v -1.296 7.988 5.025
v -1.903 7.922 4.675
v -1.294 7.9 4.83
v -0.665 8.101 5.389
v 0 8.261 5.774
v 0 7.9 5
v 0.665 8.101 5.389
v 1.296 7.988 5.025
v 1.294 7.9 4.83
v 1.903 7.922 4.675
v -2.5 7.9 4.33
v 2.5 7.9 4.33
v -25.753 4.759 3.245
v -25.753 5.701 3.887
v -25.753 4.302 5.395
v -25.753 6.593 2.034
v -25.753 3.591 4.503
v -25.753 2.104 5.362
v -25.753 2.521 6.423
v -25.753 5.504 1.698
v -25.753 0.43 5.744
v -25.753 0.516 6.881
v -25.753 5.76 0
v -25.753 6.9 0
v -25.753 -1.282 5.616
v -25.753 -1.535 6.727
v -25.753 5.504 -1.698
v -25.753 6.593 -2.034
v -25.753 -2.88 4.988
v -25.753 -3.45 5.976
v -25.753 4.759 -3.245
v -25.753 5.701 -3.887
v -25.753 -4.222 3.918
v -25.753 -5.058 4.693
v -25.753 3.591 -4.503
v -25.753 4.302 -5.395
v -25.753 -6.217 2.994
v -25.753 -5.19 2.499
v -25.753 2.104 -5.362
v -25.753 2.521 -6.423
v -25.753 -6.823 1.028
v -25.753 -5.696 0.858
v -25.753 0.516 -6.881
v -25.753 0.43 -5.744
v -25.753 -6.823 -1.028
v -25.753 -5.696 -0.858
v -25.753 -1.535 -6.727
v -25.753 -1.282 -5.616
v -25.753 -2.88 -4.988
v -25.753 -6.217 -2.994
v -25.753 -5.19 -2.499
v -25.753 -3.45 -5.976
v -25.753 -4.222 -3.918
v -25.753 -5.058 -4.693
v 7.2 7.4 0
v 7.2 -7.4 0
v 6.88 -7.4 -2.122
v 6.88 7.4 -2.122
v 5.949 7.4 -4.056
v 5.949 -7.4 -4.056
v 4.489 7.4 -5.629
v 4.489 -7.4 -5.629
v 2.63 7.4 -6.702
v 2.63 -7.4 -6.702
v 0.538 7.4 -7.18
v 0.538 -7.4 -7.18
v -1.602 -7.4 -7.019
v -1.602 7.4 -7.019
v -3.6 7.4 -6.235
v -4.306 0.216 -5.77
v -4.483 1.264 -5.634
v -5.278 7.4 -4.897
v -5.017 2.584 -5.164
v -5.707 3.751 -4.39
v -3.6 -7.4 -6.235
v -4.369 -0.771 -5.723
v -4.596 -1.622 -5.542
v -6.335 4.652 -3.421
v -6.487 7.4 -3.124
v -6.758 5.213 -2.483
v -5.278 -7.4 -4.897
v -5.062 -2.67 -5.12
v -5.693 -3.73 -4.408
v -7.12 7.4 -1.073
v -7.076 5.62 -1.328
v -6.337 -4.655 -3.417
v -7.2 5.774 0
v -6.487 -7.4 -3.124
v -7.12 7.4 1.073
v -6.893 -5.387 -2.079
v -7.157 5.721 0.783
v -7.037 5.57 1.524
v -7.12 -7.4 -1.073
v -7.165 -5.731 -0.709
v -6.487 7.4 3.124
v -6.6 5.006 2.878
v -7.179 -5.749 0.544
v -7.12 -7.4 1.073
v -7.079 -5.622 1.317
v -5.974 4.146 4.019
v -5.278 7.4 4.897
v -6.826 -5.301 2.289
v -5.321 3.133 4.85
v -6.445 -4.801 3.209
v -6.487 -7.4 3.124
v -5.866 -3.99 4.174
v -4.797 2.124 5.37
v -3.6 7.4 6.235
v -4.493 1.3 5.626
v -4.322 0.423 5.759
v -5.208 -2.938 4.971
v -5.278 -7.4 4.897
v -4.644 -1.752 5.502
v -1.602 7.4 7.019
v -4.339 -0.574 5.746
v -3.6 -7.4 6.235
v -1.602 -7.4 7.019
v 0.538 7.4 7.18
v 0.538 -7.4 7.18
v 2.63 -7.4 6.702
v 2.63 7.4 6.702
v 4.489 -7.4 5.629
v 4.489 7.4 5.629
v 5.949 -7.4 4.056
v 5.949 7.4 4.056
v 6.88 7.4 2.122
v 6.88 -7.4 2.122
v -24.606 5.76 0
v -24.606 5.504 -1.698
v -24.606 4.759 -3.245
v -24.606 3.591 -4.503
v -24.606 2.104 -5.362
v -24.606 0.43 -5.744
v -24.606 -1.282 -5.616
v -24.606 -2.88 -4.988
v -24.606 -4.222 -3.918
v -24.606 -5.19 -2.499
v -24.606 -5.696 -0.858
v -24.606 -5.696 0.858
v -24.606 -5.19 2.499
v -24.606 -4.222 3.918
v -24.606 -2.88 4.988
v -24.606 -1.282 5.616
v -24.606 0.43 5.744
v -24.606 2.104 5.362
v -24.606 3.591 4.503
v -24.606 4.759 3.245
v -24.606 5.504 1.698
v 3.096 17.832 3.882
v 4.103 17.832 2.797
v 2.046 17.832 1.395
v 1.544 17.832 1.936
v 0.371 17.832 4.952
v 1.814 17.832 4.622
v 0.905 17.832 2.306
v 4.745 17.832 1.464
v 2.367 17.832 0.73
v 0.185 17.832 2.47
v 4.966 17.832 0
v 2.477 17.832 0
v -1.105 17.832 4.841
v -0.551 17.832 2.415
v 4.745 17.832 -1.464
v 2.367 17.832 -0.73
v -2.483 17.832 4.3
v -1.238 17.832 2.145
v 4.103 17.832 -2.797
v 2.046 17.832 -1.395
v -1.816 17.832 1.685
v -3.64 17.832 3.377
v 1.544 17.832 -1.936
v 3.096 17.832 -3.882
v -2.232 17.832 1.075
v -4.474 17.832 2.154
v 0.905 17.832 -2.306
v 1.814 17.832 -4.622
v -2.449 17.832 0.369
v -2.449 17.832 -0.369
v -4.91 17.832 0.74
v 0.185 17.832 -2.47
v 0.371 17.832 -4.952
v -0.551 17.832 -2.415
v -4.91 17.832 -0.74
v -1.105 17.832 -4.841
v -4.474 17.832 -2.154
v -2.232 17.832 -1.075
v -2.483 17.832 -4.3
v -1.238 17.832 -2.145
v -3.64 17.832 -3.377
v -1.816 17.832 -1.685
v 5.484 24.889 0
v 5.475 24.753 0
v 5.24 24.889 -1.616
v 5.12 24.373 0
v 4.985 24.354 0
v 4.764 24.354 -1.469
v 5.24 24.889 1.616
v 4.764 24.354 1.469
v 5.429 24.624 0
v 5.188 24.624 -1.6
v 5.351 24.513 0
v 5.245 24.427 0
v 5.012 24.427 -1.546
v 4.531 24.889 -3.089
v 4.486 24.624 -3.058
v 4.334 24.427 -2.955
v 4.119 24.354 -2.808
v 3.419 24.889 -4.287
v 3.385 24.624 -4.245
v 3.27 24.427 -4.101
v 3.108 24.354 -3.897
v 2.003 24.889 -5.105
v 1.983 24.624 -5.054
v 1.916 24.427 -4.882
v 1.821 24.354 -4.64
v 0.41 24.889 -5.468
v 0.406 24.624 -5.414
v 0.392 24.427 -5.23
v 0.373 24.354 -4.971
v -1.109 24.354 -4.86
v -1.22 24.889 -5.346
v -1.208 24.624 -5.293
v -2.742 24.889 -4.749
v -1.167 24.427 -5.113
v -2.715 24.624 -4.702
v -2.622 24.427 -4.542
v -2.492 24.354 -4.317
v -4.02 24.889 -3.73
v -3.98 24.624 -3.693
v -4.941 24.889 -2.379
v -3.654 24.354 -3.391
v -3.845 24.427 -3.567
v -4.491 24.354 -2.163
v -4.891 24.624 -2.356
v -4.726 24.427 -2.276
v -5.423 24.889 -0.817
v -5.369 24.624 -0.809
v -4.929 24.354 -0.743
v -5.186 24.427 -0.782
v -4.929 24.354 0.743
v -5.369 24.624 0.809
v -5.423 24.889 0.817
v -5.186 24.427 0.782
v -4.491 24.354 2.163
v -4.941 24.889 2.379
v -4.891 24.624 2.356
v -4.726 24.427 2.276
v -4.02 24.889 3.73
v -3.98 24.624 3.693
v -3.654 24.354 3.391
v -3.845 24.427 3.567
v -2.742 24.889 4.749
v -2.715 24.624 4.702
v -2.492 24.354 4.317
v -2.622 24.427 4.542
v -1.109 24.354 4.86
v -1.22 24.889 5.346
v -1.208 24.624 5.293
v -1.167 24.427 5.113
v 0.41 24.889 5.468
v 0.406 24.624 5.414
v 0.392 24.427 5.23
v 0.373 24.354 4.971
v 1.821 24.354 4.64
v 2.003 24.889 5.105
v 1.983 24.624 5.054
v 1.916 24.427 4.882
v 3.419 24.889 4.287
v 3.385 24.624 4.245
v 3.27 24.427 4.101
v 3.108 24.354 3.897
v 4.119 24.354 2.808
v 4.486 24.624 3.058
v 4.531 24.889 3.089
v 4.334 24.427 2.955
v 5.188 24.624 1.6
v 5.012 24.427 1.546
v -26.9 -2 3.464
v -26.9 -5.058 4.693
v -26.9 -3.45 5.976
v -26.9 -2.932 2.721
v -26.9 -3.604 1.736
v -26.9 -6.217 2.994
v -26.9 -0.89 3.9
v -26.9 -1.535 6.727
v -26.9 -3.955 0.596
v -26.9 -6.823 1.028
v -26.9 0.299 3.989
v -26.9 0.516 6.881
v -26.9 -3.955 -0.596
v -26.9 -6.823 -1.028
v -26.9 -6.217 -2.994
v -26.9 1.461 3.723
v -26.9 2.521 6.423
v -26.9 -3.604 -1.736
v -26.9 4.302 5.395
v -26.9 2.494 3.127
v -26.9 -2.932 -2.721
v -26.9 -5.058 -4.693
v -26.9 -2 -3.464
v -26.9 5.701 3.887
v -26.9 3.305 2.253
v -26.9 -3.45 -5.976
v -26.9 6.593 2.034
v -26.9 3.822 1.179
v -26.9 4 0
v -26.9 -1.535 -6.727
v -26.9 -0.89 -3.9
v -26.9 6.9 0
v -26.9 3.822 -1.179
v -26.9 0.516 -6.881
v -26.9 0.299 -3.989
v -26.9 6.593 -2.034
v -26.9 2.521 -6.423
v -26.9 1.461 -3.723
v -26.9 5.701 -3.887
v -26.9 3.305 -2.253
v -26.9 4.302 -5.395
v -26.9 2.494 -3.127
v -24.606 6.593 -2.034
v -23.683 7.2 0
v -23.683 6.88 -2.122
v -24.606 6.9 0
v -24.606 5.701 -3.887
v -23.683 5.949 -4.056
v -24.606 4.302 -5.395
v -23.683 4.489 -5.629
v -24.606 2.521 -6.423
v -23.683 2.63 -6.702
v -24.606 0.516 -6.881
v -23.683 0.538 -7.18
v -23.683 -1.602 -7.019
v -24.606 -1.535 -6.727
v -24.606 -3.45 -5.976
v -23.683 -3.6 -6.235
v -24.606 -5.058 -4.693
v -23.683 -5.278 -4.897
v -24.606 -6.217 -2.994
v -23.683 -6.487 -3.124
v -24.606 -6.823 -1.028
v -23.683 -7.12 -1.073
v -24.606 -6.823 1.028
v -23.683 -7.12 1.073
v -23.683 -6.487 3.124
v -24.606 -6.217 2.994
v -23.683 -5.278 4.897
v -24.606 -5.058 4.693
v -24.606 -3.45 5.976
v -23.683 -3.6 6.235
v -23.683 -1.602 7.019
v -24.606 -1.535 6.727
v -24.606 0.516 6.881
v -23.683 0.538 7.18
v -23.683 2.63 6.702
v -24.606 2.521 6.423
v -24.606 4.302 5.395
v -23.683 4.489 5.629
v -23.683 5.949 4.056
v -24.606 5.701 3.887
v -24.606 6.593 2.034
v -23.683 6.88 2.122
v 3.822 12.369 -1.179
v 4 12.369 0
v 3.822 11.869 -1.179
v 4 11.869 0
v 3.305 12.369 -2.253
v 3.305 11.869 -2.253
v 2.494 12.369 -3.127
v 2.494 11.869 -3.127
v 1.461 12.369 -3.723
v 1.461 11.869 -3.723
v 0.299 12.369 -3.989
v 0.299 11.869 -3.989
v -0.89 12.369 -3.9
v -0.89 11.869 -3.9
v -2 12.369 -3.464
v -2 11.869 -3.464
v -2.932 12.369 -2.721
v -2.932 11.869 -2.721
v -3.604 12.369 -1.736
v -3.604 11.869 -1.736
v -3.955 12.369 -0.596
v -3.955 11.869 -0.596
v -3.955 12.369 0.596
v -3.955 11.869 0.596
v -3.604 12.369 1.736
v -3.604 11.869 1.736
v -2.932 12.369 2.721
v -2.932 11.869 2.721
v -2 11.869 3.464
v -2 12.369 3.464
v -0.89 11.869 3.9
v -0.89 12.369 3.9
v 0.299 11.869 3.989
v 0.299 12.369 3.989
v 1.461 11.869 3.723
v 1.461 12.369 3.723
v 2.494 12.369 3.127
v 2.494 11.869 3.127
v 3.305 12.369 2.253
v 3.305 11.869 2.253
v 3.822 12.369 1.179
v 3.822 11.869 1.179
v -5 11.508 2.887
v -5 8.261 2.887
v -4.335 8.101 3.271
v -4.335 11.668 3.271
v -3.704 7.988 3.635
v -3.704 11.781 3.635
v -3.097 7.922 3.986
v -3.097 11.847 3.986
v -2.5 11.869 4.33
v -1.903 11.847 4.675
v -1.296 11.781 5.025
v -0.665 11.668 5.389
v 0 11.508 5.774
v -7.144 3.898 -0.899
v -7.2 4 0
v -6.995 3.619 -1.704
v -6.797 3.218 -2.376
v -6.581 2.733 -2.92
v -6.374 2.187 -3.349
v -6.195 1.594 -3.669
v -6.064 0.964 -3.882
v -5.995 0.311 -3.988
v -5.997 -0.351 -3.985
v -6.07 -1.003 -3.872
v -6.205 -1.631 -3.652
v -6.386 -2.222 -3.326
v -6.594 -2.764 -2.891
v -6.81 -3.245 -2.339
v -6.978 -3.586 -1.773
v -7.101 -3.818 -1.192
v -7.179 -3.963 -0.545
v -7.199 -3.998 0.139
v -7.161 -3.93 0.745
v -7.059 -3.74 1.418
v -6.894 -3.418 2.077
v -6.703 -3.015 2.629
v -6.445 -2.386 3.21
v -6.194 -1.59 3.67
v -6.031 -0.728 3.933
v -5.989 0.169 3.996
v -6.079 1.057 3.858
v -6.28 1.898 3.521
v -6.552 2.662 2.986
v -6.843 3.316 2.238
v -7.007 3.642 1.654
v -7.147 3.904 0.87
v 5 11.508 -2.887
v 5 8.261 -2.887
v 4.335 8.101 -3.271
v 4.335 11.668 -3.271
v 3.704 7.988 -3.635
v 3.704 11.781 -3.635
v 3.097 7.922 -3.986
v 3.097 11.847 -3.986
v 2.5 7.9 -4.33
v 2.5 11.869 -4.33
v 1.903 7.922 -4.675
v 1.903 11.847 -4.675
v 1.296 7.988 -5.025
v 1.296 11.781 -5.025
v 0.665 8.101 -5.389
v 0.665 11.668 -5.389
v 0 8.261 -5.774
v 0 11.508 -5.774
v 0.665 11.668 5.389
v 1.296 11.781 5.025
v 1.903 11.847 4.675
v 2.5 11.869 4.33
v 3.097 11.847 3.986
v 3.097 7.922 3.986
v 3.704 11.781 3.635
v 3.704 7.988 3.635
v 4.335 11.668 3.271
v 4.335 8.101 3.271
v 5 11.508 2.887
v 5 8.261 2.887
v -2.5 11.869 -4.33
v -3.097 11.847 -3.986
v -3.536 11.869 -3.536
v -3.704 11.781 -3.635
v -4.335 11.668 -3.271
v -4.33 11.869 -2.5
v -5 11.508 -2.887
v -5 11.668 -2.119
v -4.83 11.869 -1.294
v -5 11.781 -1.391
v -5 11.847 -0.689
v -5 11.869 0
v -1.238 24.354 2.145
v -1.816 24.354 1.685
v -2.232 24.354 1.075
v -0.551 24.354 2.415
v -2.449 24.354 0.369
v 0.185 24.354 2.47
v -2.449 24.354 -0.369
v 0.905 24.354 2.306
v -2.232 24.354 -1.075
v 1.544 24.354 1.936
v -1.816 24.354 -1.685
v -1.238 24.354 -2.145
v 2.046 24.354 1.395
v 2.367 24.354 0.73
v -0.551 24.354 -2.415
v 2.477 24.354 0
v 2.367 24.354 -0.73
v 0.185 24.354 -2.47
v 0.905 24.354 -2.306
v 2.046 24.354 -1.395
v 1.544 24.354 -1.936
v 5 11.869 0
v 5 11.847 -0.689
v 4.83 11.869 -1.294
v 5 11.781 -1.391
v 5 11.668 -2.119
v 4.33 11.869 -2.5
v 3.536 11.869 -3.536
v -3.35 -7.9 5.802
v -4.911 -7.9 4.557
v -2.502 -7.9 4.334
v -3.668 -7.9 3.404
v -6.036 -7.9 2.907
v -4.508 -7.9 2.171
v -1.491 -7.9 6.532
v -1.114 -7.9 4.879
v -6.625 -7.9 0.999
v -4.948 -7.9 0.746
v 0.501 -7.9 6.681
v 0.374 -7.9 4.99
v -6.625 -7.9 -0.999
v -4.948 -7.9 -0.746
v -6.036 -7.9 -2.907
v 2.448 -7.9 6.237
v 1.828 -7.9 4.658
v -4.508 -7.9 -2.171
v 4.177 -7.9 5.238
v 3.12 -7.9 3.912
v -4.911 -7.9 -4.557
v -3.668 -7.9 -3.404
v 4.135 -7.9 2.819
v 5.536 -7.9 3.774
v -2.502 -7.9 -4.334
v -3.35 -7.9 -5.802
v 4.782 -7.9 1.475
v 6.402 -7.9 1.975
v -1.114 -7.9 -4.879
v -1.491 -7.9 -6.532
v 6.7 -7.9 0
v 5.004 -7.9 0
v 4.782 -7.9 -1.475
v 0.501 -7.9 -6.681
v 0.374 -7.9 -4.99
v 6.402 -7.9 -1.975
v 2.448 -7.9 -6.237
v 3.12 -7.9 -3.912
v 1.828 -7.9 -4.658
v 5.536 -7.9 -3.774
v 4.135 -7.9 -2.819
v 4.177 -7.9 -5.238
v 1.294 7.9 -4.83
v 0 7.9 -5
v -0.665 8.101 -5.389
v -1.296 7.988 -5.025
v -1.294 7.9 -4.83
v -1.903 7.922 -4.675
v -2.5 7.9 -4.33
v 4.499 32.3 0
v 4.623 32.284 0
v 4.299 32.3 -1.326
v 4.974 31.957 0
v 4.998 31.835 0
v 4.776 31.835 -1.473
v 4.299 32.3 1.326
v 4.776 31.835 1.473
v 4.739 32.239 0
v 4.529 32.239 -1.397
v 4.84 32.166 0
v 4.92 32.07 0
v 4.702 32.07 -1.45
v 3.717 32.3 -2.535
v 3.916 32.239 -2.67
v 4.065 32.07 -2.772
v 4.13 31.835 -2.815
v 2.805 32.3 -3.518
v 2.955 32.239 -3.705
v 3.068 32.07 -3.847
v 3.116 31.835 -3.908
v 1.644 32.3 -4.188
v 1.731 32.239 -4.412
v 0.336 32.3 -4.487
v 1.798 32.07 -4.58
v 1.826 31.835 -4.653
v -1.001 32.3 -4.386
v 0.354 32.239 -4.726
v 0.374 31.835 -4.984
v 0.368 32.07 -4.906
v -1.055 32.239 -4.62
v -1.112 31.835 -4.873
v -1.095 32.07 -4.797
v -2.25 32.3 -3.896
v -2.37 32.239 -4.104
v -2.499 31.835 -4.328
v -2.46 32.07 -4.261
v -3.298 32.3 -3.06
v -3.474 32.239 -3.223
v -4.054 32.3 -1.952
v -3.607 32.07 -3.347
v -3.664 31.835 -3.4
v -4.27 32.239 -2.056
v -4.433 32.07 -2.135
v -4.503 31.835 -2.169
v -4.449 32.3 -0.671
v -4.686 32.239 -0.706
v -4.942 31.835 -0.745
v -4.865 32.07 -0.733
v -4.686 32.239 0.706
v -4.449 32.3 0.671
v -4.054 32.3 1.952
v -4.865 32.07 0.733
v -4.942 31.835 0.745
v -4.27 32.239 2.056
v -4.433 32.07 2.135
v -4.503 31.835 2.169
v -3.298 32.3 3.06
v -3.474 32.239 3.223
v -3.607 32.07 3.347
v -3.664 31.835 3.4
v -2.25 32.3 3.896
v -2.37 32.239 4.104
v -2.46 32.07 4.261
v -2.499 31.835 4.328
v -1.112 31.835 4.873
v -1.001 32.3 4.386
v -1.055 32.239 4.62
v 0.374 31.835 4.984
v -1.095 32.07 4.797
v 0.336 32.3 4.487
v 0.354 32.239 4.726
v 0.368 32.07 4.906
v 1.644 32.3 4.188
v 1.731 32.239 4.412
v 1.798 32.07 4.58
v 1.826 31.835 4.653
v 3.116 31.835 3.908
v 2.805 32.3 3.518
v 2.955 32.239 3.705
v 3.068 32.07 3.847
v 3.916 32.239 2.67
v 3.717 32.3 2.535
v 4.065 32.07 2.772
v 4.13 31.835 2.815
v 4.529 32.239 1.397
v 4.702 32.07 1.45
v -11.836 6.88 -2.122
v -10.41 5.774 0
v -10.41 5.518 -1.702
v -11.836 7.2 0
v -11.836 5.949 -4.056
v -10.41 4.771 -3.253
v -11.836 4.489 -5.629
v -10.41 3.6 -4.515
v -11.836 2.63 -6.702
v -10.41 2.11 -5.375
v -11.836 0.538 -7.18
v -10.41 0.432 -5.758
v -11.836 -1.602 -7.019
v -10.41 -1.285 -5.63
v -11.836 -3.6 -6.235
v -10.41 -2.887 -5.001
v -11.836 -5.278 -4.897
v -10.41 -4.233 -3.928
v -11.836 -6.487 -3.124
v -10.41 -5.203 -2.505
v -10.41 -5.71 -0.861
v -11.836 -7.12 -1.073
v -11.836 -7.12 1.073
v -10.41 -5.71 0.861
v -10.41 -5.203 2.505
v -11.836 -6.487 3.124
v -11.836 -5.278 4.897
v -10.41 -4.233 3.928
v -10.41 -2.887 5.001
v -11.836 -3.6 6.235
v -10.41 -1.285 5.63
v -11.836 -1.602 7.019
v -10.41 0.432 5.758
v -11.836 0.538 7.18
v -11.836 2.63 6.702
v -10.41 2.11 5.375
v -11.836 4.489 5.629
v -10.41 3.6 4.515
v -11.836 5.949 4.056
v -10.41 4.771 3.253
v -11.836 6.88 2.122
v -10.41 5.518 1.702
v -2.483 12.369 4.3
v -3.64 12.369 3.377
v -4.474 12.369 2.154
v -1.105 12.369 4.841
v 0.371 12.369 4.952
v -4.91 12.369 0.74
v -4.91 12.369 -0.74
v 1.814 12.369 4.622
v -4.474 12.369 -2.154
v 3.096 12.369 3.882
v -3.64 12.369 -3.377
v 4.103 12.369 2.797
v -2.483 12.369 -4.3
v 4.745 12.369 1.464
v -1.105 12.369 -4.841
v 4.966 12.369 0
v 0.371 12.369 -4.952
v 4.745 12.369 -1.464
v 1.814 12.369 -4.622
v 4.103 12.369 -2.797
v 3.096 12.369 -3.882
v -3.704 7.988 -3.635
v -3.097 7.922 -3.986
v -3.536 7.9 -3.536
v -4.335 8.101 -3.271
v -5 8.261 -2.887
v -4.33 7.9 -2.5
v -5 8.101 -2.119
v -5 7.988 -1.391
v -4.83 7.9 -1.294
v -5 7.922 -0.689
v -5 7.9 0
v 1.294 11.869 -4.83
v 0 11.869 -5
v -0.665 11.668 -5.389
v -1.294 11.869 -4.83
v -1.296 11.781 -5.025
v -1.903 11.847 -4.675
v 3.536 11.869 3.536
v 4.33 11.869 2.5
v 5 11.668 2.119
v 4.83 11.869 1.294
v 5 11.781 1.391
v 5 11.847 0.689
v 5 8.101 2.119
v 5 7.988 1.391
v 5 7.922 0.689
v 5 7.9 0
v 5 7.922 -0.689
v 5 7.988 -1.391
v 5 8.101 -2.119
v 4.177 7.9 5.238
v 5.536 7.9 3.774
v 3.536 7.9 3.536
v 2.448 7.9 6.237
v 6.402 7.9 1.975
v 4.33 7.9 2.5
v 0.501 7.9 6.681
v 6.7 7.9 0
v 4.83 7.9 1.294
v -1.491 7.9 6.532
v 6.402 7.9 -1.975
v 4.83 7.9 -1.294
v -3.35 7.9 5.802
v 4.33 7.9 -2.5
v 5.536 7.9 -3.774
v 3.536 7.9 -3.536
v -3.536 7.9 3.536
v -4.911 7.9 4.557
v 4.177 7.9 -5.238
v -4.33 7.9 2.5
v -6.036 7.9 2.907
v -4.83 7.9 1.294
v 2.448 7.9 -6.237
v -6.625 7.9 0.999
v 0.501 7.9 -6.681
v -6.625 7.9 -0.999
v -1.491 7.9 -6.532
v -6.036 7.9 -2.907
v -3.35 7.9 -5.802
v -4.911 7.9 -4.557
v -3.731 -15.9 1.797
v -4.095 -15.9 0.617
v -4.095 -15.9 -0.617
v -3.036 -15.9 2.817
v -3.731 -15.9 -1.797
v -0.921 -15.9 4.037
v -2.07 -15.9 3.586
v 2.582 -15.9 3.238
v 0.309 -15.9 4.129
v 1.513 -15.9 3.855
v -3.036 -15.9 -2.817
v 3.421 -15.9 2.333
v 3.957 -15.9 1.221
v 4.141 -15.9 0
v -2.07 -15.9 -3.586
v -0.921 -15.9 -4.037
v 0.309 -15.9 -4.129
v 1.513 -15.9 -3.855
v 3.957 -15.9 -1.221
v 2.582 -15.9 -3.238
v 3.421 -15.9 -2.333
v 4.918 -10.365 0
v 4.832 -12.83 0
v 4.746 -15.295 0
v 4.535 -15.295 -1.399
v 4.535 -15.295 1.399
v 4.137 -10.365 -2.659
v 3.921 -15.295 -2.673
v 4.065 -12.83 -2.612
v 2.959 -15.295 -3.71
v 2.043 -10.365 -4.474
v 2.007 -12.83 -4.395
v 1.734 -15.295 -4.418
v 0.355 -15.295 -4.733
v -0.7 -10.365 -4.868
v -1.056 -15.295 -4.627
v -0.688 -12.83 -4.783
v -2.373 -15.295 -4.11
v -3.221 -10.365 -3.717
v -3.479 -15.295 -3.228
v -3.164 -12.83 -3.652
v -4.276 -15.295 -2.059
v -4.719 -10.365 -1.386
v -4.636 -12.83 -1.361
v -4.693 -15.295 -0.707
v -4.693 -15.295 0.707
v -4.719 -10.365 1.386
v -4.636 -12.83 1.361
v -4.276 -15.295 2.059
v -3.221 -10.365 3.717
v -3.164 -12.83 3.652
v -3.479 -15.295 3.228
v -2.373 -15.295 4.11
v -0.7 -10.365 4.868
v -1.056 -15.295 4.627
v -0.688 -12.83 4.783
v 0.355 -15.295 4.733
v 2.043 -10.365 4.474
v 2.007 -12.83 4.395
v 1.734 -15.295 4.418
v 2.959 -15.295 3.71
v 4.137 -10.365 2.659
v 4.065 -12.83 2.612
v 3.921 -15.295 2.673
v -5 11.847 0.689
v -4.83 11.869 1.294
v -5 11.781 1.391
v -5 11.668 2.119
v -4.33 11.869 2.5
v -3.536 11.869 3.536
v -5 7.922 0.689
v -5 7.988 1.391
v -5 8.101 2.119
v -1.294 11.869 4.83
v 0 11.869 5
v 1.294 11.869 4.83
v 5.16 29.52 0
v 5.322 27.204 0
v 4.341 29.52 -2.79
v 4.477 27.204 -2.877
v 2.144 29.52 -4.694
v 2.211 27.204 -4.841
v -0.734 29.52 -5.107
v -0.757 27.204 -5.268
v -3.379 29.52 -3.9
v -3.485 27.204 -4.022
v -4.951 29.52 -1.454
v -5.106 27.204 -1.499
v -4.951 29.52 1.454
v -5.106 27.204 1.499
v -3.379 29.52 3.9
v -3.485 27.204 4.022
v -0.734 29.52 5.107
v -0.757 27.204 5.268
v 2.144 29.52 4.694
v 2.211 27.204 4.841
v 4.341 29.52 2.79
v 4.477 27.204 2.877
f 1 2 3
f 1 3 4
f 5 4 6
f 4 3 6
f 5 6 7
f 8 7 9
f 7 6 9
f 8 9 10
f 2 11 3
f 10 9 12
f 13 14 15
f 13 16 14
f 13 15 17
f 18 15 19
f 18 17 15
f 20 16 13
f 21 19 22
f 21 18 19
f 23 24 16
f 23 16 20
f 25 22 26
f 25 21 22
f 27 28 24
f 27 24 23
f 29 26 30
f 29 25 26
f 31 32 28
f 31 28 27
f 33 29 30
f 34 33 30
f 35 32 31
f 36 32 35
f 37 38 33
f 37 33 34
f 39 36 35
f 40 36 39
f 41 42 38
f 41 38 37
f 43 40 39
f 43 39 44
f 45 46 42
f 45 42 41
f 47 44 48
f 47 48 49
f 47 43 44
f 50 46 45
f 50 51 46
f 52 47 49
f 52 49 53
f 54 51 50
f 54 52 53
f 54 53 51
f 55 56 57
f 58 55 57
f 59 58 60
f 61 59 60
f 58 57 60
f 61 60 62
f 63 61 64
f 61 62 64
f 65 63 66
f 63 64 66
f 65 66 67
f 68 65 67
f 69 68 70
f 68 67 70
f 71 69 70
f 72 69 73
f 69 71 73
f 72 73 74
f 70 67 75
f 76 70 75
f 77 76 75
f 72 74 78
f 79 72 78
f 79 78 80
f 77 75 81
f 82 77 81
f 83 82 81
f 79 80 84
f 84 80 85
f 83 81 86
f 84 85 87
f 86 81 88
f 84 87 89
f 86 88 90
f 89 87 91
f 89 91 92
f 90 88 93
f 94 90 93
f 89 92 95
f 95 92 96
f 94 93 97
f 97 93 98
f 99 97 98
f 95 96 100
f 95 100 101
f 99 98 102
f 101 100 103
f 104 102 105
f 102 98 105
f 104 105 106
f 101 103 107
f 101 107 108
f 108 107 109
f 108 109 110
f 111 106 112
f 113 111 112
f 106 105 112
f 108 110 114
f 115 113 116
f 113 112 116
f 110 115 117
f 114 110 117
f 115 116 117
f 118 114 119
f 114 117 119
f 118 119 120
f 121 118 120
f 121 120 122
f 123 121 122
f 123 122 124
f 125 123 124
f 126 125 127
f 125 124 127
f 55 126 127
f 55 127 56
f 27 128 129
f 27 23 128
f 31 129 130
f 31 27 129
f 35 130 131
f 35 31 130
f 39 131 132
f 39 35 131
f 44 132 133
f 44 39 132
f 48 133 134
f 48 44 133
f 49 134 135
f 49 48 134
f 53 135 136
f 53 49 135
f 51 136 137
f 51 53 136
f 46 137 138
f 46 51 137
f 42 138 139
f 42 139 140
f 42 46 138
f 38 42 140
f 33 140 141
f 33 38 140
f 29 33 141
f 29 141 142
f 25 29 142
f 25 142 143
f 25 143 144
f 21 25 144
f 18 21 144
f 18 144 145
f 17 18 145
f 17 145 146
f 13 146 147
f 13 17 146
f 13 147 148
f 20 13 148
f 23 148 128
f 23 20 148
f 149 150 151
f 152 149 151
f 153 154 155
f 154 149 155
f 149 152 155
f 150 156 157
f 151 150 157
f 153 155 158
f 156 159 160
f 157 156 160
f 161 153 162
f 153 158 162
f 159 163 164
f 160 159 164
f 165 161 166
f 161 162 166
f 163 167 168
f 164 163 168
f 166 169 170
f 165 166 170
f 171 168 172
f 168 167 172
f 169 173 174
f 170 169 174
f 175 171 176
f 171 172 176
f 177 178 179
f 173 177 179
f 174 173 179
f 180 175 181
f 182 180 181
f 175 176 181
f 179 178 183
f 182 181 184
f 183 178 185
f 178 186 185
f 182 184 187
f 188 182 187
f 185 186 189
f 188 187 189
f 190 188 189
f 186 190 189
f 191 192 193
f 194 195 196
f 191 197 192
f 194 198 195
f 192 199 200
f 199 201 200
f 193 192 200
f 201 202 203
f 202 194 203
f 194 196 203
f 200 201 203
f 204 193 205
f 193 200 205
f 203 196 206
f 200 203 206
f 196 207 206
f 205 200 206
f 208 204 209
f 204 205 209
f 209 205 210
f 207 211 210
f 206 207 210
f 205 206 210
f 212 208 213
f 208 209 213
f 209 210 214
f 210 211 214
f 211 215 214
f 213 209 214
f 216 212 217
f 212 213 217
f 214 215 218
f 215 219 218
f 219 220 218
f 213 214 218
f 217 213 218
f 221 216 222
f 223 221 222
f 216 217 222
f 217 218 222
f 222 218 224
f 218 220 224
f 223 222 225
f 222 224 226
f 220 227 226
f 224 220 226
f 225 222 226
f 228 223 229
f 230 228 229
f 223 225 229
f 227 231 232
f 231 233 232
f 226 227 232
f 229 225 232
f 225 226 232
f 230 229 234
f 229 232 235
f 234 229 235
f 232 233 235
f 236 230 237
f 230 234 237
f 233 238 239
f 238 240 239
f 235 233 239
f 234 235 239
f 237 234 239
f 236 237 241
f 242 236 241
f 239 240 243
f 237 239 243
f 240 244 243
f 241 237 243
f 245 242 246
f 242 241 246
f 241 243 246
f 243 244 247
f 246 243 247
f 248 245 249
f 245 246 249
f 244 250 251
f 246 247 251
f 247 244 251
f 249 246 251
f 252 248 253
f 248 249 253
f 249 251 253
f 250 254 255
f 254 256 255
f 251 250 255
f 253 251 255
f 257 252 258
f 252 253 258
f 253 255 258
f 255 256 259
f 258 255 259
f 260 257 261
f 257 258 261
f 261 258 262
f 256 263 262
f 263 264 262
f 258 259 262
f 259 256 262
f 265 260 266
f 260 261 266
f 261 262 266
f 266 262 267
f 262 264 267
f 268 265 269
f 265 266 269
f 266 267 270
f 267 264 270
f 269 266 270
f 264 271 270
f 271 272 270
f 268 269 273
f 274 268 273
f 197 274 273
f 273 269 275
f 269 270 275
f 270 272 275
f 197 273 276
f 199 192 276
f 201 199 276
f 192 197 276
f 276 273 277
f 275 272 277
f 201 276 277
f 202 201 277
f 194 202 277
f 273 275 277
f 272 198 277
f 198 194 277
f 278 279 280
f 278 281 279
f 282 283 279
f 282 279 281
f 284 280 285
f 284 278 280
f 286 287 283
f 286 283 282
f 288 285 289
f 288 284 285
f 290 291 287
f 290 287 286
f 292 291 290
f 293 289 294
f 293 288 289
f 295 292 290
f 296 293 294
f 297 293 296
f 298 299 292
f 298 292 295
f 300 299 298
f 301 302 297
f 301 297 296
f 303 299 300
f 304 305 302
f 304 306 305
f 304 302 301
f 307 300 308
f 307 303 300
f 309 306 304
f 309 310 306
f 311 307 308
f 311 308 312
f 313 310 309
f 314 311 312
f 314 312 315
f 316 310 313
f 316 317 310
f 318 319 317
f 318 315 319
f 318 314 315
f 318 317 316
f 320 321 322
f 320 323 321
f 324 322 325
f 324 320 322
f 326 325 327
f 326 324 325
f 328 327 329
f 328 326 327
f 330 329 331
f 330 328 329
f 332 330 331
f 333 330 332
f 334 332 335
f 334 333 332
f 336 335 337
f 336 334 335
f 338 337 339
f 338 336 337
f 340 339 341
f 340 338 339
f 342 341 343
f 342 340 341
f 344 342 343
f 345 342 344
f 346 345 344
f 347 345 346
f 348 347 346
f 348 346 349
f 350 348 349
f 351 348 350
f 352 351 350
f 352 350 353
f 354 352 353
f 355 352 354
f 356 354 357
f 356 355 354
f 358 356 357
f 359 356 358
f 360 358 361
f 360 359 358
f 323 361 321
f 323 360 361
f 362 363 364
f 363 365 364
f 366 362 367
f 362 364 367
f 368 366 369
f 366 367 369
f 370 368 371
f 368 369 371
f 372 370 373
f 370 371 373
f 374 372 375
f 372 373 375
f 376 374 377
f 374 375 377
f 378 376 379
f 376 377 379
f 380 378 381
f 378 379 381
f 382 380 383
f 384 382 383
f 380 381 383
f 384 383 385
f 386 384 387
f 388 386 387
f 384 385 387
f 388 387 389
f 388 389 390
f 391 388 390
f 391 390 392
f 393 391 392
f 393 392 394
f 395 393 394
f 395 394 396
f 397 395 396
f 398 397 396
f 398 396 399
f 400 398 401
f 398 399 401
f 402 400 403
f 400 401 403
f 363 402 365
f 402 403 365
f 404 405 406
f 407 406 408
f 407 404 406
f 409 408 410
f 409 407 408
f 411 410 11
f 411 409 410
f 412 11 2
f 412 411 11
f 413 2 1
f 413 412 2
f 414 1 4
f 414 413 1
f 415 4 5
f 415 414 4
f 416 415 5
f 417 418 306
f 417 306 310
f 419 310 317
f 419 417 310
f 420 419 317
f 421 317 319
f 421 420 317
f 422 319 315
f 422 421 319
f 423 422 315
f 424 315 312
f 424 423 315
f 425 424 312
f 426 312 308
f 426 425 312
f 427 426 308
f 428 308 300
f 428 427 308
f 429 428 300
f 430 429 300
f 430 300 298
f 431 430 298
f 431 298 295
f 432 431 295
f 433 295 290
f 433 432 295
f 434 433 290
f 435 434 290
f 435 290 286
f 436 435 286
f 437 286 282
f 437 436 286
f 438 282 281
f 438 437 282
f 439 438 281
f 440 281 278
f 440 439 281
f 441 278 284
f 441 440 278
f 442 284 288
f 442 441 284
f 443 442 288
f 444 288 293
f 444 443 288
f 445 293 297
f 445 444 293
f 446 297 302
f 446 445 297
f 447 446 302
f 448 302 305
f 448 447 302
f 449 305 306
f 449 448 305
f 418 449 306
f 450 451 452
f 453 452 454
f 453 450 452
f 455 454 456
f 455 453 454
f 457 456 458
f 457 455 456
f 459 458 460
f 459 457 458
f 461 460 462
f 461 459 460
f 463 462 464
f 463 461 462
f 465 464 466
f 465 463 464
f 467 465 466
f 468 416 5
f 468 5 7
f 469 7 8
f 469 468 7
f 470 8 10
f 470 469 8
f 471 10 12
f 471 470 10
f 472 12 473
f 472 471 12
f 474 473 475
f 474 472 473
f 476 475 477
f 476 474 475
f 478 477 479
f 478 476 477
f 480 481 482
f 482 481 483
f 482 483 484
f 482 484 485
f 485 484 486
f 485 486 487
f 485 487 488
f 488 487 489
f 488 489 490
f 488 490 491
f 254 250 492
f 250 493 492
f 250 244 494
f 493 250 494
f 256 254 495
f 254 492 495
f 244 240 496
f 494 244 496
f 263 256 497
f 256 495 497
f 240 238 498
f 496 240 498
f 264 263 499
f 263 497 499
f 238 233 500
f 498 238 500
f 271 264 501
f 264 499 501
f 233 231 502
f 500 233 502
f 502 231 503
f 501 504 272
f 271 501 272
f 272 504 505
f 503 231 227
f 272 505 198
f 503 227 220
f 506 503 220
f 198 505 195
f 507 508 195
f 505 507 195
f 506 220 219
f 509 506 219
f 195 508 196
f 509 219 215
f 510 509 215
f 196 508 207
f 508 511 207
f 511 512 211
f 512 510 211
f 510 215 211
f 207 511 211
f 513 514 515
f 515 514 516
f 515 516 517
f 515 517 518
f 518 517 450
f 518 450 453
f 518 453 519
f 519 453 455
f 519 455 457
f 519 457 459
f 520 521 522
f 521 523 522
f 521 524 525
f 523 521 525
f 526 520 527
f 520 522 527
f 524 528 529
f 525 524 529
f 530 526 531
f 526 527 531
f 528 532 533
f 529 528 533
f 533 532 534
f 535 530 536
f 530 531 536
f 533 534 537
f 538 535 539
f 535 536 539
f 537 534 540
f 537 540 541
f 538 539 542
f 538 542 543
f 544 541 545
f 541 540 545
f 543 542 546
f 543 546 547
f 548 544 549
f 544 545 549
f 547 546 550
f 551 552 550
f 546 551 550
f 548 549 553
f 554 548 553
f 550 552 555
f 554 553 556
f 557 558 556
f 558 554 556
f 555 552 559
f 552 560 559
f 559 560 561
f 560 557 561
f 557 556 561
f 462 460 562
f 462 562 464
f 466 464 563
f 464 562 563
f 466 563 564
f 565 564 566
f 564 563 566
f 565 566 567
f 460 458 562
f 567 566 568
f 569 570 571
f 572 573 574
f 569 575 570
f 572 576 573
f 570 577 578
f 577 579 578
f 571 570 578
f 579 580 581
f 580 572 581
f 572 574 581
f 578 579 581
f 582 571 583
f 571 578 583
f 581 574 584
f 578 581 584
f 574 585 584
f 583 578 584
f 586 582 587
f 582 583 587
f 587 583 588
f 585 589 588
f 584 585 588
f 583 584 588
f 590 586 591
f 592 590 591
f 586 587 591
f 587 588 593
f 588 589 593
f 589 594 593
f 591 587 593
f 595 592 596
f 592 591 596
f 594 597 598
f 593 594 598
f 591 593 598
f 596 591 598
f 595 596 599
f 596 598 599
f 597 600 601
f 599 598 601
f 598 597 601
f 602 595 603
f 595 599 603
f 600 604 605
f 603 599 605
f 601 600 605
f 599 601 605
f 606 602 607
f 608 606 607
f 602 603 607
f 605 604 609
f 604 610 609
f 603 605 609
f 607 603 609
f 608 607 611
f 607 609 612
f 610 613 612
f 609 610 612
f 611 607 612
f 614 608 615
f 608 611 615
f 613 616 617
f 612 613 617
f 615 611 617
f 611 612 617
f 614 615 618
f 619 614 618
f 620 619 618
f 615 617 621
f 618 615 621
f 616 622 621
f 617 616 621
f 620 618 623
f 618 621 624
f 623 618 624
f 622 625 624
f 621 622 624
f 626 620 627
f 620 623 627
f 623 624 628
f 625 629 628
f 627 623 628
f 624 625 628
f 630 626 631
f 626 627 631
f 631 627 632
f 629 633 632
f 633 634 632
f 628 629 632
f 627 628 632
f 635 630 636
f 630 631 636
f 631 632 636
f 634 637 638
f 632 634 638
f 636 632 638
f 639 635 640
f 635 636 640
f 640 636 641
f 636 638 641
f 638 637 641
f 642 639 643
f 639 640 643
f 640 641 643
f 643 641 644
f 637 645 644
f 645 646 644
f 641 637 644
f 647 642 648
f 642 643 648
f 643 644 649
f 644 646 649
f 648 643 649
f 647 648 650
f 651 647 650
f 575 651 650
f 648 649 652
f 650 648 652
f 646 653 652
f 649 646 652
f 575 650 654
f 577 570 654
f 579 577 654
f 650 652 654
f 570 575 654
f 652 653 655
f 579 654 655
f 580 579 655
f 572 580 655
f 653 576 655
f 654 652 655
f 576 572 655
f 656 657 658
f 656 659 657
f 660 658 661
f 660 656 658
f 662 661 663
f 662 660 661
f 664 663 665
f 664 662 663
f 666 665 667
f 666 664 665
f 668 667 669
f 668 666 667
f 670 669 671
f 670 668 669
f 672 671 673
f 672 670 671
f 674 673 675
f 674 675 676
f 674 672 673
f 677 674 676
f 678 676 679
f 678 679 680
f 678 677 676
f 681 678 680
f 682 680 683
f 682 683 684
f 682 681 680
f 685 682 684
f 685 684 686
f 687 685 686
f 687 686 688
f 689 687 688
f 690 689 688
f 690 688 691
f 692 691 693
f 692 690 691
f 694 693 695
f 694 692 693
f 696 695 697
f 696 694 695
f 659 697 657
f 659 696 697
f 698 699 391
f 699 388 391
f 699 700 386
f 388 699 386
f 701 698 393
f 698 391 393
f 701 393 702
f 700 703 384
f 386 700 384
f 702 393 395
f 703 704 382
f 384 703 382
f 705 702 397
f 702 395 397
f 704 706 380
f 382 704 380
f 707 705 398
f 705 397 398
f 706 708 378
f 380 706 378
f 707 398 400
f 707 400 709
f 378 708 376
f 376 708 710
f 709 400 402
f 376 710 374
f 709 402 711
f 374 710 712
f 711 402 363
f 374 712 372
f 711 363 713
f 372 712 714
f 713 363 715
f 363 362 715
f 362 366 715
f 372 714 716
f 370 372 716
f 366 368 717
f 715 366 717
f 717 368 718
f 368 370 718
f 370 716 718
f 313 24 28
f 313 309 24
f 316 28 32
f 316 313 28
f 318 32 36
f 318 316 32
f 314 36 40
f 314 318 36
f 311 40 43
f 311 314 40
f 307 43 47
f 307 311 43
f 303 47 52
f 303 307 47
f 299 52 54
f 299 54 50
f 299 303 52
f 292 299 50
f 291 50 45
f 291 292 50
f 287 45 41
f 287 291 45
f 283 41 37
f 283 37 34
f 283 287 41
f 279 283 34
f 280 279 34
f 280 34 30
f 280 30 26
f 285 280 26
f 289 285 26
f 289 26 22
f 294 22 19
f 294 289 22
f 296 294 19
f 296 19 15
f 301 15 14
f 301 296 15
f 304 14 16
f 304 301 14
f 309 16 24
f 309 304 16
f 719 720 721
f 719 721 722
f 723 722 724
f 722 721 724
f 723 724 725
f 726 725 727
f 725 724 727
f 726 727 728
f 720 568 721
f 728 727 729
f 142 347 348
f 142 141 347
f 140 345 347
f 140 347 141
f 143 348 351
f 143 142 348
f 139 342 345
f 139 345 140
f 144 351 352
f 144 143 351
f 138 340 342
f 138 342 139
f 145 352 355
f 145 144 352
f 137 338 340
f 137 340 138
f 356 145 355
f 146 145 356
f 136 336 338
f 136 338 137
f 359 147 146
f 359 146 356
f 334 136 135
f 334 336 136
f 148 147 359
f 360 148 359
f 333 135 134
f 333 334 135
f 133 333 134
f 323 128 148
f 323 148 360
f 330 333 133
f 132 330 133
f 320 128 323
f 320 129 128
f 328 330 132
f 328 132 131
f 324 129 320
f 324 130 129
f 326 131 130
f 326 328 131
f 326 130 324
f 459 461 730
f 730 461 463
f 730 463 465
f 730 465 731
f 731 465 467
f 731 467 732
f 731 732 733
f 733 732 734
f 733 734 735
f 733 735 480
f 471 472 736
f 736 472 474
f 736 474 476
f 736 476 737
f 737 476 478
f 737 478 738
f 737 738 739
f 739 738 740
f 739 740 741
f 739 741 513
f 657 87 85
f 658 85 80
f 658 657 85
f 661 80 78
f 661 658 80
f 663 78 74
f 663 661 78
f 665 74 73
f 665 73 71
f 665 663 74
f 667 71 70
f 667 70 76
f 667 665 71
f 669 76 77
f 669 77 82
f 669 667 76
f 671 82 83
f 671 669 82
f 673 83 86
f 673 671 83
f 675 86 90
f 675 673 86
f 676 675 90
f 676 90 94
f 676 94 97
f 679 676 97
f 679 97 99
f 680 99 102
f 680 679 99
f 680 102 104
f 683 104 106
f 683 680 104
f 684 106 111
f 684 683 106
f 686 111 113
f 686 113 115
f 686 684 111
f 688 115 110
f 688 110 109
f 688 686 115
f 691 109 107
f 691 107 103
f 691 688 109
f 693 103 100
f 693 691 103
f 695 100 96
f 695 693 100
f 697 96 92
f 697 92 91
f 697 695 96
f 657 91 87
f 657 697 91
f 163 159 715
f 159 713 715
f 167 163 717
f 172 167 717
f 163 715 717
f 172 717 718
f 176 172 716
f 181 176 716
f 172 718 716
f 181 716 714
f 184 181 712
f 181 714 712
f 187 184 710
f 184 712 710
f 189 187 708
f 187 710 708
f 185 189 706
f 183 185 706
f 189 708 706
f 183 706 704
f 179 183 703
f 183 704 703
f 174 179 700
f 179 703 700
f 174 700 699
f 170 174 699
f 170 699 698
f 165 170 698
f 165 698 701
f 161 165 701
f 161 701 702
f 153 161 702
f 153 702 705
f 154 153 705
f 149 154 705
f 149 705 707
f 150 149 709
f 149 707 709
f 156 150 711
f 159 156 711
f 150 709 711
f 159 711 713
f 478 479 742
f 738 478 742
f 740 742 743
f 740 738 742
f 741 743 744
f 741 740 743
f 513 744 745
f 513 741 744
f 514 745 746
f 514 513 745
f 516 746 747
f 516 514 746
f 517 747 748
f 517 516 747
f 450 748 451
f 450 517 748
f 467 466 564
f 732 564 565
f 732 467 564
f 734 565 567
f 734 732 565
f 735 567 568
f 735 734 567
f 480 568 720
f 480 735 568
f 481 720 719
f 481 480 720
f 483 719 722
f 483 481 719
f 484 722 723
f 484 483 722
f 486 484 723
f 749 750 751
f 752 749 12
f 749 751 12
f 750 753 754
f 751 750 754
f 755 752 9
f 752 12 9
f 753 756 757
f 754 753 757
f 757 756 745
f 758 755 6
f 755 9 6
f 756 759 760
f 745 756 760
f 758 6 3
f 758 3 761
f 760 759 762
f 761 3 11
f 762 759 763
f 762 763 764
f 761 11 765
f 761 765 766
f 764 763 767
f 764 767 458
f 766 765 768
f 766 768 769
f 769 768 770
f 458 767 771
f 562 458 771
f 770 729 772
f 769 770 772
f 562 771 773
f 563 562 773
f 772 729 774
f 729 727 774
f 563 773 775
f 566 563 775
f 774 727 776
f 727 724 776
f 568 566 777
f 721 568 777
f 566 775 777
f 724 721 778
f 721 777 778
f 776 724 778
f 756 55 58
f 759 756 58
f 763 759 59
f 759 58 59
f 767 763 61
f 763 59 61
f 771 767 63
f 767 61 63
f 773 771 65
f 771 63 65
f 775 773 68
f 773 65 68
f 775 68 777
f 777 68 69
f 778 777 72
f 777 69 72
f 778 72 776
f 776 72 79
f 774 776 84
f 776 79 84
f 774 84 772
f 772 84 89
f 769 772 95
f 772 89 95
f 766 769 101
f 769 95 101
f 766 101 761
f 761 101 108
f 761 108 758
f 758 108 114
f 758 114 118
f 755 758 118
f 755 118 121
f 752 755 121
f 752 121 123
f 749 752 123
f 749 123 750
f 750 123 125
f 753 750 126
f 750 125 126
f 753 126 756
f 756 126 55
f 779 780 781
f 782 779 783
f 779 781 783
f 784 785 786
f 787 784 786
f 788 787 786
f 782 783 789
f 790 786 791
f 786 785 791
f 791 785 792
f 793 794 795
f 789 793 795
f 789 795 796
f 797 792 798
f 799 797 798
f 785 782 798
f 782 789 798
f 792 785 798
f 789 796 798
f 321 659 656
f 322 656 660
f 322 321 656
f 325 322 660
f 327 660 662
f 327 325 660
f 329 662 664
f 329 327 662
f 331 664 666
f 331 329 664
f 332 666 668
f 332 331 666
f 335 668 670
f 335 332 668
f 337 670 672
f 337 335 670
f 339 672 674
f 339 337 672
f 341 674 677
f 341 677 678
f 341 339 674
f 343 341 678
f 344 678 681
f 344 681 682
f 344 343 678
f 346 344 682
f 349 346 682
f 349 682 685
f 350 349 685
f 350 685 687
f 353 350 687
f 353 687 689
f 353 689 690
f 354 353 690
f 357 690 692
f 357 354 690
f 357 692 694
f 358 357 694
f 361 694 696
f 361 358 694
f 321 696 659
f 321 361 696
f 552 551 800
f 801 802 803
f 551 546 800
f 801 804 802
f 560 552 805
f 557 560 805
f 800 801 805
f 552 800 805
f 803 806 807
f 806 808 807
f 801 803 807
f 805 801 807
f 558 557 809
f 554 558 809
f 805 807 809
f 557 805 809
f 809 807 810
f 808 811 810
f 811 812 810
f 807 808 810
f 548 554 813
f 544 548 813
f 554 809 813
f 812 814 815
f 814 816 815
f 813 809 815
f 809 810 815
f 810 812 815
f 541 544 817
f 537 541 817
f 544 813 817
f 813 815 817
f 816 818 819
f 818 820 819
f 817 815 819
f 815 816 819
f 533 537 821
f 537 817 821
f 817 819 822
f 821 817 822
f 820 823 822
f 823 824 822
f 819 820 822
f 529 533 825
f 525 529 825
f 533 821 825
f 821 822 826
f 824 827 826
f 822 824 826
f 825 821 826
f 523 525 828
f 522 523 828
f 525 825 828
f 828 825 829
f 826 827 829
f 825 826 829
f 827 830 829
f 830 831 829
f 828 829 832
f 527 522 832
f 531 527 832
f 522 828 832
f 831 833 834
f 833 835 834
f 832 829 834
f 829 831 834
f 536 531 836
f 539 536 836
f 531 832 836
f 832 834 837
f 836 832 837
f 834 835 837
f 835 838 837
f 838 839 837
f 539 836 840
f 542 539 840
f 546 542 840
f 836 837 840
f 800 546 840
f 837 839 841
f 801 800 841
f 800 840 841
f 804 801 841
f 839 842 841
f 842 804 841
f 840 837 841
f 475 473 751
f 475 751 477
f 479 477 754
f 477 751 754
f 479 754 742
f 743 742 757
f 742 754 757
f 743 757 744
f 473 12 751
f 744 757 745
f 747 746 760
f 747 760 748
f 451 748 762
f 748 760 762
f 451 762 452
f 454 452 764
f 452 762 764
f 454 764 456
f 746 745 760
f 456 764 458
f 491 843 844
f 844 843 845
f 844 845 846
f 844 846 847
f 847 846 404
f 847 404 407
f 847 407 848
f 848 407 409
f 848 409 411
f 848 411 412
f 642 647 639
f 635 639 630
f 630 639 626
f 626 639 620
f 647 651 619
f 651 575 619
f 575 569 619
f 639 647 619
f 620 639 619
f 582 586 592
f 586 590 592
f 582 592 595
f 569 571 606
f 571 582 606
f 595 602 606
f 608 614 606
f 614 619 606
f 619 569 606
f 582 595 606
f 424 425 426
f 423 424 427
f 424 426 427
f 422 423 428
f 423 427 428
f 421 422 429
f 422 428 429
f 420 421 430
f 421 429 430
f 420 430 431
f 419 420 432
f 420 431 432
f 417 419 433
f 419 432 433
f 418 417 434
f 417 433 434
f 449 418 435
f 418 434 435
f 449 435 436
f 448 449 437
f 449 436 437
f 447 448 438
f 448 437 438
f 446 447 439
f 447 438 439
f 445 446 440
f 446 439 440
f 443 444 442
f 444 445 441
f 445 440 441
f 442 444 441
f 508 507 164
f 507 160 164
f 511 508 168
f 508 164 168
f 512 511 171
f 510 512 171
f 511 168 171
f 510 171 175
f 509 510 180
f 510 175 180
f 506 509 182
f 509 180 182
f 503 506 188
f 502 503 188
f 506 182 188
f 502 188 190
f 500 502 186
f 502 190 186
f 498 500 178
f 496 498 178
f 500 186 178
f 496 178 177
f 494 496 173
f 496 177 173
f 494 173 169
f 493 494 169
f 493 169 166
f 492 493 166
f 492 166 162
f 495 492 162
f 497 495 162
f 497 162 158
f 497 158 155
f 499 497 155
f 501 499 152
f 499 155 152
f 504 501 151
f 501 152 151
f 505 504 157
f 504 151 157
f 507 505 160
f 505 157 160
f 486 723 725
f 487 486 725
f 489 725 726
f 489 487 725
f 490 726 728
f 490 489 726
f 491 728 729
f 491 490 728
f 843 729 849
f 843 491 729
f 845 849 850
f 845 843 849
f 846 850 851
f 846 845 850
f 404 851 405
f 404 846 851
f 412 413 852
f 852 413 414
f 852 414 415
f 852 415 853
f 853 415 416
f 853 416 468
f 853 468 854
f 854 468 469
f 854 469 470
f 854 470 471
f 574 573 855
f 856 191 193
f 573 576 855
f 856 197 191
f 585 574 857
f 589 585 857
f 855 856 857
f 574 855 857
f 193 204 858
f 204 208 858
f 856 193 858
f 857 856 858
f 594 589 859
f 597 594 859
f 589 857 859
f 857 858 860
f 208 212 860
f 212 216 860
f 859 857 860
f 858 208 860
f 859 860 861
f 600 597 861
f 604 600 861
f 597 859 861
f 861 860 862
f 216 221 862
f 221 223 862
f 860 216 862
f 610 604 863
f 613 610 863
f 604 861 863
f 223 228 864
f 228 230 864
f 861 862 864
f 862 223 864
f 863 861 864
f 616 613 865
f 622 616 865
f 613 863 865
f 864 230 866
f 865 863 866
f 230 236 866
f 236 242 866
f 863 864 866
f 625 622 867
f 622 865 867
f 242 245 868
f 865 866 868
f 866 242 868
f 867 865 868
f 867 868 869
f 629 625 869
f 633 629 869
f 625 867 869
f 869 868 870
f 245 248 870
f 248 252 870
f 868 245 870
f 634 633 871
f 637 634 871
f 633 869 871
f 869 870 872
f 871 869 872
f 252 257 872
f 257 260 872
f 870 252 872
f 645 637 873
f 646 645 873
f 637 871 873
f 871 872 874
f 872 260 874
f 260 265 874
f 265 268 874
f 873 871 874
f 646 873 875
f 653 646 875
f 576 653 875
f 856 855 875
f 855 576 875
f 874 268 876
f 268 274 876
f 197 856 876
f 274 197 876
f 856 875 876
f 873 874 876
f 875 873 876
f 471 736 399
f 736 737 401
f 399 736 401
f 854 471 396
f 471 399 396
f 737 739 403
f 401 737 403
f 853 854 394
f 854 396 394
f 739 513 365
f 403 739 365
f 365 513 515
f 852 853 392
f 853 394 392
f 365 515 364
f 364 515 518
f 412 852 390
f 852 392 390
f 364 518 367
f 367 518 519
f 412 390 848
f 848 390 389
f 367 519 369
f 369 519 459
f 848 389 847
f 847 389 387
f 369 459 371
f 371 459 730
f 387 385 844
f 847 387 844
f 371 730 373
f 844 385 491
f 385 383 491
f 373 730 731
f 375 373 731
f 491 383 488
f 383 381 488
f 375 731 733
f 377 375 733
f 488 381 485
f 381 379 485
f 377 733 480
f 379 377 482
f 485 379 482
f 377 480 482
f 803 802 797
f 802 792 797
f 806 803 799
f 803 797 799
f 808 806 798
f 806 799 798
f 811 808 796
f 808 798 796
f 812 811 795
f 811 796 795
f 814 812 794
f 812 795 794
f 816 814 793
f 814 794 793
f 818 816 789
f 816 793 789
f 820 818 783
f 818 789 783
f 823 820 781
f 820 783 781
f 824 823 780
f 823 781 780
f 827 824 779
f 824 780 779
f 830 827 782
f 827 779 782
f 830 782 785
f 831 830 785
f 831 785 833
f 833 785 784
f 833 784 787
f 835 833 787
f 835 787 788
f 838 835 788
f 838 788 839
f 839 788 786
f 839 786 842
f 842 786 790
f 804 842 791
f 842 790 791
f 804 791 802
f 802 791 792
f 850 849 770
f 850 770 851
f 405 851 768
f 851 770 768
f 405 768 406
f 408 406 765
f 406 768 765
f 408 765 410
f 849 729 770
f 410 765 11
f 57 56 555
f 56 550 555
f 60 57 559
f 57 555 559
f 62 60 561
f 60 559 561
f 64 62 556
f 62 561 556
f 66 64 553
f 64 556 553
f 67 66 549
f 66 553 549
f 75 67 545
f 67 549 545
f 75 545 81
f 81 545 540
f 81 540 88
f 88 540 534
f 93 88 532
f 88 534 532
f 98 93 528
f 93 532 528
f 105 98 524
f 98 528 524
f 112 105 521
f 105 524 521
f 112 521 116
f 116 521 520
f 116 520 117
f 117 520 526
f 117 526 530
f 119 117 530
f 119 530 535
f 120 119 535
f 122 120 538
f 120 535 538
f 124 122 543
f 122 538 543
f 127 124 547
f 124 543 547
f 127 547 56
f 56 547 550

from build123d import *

# Parameters (mm, degrees)
CUT_EXTRUDE1_DEPTH = 3.96916


with BuildPart() as part:
    # Sketch1 → Revolve1 (revolve)
    with BuildSketch(Plane.XY):
        with BuildLine():
            Line((0, 32.3), (4.499259698, 32.3))
            ThreePointArc((4.499259698, 32.3), (4.840258878, 32.165676851), (4.998041723, 31.834878237))
            Line((4.998041723, 31.834878237), (5.483758073, 24.888810821))
            ThreePointArc((5.483758073, 24.888810821), (5.350652899, 24.512933404), (4.984976048, 24.353932584))
            Line((4.984976048, 24.353932584), (2.4768, 24.353932584))
            Line((2.4768, 24.353932584), (2.4768, 17.832081348))
            Line((2.4768, 17.832081348), (4.965517241, 17.832081348))
            Line((4.965517241, 17.832081348), (4.965517241, 12.36916))
            Line((4.965517241, 12.36916), (4, 12.36916))
            Line((4, 12.36916), (4, 11.86916))
            Line((4, 11.86916), (5, 11.86916))
            Line((5, 11.86916), (6, 11.402852342))
            Line((6, 11.402852342), (6, 8.366307658))
            Line((6, 8.366307658), (5, 7.9))
            Line((5, 7.9), (6.7, 7.9))
            Line((6.7, 7.9), (7.2, 7.4))
            Line((7.2, 7.4), (7.2, -7.4))
            Line((7.2, -7.4), (6.7, -7.9))
            Line((6.7, -7.9), (5.004037223, -7.9))
            Line((5.004037223, -7.9), (4.745792083, -15.295173238))
            Line((4.745792083, -15.295173238), (4.140965321, -15.9))
            Line((4.140965321, -15.9), (0, -15.9))
            Line((0, -15.9), (0, 32.3))
        make_face()
    revolve(axis=Axis((0, -15.9, 0), (0, 1, 0)))

    # Sketch2 → Cut-Extrude1 (cut)
    with BuildSketch(Plane(origin=(0, 11.86916, 0), x_dir=(1, 0, 0), z_dir=(0, 1, 0))):
        Polygon((-6.5, -3.75277675), (0, -7.505553499), (6.5, -3.75277675), (6.5, 3.75277675), (0, 7.505553499), (-6.5, 3.75277675), align=None)
        Polygon((-5, -2.886751346), (0, -5.773502692), (5, -2.886751346), (5, 2.886751346), (0, 5.773502692), (-5, 2.886751346), align=None, mode=Mode.SUBTRACT)
    extrude(amount=-CUT_EXTRUDE1_DEPTH, mode=Mode.SUBTRACT)

    # Sketch3 → Revolve2 (revolve)
    with BuildSketch(Plane.XY):
        Polygon((-26.9, 4), (0, 4), (0, 5.7744), (-10.4104, 5.7744), (-11.836, 7.2), (-23.683115991, 7.2), (-24.606421053, 6.9), (-24.606421053, 5.76), (-25.753210526, 5.76), (-25.753210526, 6.9), (-26.9, 6.9), align=None)
    revolve(axis=Axis((0, 0, 0), (-1, 0, 0)))


solid = part.part
